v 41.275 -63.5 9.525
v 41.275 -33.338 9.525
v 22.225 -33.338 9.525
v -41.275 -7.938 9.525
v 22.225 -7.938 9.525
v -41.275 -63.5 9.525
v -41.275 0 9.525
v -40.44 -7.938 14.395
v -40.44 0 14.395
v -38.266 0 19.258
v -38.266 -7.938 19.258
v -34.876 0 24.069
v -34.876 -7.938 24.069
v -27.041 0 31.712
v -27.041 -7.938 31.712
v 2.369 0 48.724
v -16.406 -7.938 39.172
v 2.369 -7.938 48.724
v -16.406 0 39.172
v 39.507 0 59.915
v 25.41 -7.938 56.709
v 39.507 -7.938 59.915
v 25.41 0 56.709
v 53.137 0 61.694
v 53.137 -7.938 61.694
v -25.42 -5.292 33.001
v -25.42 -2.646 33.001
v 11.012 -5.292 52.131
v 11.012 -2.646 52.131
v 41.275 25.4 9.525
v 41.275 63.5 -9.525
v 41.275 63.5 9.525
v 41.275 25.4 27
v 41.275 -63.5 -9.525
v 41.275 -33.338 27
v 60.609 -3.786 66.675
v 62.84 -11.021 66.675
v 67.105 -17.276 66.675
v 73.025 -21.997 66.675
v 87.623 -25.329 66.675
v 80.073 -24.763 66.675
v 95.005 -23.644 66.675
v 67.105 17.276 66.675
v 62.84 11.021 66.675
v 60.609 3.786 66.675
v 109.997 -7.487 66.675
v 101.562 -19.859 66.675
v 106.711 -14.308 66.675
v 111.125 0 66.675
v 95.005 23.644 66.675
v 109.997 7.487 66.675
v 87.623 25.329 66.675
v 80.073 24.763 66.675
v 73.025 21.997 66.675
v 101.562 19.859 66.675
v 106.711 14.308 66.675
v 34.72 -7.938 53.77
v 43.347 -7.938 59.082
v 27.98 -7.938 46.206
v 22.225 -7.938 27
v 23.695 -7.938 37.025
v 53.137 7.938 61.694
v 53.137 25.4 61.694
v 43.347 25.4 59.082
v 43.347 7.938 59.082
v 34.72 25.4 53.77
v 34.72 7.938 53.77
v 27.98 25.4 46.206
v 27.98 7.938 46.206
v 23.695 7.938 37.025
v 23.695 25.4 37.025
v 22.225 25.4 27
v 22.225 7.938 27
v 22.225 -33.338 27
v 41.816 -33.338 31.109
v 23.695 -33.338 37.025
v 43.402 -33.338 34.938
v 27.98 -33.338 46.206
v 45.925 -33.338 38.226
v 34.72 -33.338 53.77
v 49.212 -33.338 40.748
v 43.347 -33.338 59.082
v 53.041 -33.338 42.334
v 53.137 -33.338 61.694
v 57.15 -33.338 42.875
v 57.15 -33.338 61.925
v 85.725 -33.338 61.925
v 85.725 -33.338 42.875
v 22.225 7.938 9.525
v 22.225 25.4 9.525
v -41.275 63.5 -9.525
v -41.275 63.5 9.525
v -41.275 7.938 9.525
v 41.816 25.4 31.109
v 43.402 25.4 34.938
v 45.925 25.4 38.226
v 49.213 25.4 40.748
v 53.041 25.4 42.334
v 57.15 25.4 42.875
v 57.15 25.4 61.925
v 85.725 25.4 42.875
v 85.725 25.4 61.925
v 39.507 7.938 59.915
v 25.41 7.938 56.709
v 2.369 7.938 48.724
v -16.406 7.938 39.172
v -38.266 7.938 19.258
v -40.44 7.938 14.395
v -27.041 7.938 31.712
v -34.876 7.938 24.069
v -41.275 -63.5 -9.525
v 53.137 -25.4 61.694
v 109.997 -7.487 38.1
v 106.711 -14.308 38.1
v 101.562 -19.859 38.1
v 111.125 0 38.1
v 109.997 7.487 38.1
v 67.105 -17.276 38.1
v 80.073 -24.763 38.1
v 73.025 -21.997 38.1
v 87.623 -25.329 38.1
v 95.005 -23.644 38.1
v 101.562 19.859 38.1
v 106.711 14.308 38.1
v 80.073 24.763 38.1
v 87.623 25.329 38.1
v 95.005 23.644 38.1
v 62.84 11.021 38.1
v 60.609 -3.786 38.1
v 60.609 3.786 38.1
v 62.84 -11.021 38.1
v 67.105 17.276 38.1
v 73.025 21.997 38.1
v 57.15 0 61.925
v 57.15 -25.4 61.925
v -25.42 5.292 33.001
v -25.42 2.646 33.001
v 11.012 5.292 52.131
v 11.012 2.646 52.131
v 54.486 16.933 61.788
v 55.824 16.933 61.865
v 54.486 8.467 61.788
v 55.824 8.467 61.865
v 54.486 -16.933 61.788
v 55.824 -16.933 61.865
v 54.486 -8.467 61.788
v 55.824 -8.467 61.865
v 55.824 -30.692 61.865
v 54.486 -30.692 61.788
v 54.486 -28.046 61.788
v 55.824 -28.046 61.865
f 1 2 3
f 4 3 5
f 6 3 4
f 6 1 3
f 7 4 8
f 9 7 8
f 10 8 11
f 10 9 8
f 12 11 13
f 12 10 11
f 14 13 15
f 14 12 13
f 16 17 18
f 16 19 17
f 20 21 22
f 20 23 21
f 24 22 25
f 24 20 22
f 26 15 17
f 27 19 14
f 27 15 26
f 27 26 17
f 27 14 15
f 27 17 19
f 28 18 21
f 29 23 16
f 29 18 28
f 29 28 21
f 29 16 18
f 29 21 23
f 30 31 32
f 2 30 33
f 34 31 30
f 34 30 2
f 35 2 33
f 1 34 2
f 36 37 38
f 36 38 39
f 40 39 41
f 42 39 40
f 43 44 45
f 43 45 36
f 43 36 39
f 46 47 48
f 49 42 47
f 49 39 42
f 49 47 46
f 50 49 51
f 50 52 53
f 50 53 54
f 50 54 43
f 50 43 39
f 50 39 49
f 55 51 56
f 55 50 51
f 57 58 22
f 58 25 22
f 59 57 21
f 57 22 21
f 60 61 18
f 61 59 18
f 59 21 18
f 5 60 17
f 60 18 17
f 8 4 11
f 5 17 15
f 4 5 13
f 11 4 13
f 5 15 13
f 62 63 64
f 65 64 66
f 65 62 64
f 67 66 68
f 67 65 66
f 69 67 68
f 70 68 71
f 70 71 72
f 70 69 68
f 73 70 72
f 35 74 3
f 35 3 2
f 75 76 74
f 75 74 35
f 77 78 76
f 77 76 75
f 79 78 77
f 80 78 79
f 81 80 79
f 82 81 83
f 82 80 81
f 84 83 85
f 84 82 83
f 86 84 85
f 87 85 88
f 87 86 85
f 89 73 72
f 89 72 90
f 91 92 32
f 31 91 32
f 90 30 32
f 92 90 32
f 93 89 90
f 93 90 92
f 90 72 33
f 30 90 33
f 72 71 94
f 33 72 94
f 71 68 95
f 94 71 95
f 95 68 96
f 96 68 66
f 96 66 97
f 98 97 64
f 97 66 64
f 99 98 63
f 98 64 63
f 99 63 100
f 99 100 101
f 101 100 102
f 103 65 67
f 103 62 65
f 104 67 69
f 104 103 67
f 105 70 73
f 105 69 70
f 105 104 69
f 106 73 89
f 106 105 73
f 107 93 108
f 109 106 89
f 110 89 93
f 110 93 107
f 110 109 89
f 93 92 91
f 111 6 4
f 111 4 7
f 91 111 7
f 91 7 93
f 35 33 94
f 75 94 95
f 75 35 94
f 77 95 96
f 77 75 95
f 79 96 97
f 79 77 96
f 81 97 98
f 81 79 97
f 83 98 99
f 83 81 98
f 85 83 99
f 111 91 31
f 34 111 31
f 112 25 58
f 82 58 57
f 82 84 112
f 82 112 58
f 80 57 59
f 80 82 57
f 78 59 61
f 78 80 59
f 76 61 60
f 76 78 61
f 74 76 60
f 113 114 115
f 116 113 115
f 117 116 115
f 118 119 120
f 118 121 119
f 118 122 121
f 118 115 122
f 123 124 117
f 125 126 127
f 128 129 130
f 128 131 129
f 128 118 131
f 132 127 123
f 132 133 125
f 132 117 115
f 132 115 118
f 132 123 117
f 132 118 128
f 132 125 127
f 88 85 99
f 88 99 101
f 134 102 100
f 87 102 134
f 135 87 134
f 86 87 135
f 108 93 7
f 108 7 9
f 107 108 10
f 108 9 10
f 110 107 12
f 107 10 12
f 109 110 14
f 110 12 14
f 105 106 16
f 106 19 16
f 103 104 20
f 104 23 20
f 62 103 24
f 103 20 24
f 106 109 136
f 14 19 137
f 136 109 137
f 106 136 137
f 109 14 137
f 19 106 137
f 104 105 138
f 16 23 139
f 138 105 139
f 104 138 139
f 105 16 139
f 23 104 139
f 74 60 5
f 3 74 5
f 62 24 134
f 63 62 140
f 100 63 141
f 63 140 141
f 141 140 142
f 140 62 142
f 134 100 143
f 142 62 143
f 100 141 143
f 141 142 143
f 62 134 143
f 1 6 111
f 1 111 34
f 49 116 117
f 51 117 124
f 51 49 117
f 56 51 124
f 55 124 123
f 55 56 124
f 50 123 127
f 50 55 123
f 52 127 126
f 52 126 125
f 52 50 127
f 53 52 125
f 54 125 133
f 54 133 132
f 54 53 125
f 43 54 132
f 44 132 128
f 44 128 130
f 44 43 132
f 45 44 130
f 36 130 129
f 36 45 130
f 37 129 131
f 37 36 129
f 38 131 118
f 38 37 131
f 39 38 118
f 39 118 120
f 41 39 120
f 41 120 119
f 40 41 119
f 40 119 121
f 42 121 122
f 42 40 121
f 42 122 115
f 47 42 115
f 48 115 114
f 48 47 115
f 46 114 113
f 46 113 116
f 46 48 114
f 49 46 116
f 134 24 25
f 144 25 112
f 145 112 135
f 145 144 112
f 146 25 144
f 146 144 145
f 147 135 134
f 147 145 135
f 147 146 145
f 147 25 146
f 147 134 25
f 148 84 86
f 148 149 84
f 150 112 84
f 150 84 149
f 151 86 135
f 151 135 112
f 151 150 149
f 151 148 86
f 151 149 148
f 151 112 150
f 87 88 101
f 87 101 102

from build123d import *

# Parameters (mm, degrees)
F1_DEPTH = 63.5
F0_W     = 25.4
F0_H     = 19.05
F2_DEPTH = 25.4
F3_DEPTH = 7.9375


with BuildPart() as f1:
    # F0 (on Front) → F1 (new body, symmetric)
    with BuildSketch(Plane.XZ):
        Polygon((22.225, 9.525), (-41.275, 9.525), (-41.275, -9.525), (41.275, -9.525), (41.275, 9.525), align=None)
    extrude(amount=F1_DEPTH, both=True)

    # F0 (on Front) → F2 (join, symmetric)
    with BuildSketch(Plane.XZ):
        with Locations((73.025, 52.4002)):
            Rectangle(F0_W, F0_H)
        with BuildLine():
            Line((22.225, 27.0002), (22.225, 9.525))
            Line((22.225, 9.525), (41.275, 9.525))
            Line((41.275, 9.525), (41.275, 27.0002))
            ThreePointArc((41.275, 27.0002), (45.9246798487, 38.2255201513), (57.15, 42.8752))
            Line((57.15, 42.8752), (60.325, 42.8752))
            Line((60.325, 42.8752), (60.325, 61.9252))
            Line((60.325, 61.9252), (57.15, 61.9252))
            add(Edge.make_bspline(
                [(53.1367765772, 61.6938545028), (54.4911838956, 61.7966953046), (55.8297911563, 61.8741143082), (57.15, 61.9252)],
                knots=[107.8534909228, 107.8534909228, 107.8534909228, 107.8534909228, 111.5045361635, 111.5045361635, 111.5045361635, 111.5045361635], degree=3))
            ThreePointArc((53.1367765772, 61.6938545028), (31.073981774, 50.2337296173), (22.225, 27.0002))
        make_face()
    extrude(amount=F2_DEPTH, both=True)

    # F0 (on Front) + F2_face (on face) → F3 (join, symmetric)
    with BuildSketch(Plane.XZ):
        with BuildLine():
            add(Edge.make_bspline(
                [(-41.275, 9.525), (-40.6705320986, 33.4339088409), (13.1269854637, 58.6558917409), (53.1367765772, 61.6938545028)],
                knots=[0, 0, 0, 0, 107.8534909228, 107.8534909228, 107.8534909228, 107.8534909228], degree=3))
            Line((-41.275, 9.525), (22.225, 9.525))
            Line((22.225, 9.525), (22.225, 27.0002))
            ThreePointArc((22.225, 27.0002), (31.073981774, 50.2337296173), (53.1367765772, 61.6938545028))
        make_face()
    with BuildSketch(Plane(origin=(48.877117708, -25.4, 41.5252289167), x_dir=(1, 0, 0), z_dir=(0, -1, 0))):
        with BuildLine():
            Line((36.847882292, 20.3999710833), (8.272882292, 20.3999710833))
            add(Edge.make_bspline(
                [(4.2596588692, 20.1686255861), (5.6140661876, 20.2714663879), (6.9526734483, 20.3488853915), (8.272882292, 20.3999710833)],
                knots=[107.8534909228, 107.8534909228, 107.8534909228, 107.8534909228, 111.5045361635, 111.5045361635, 111.5045361635, 111.5045361635], degree=3))
            ThreePointArc((4.2596588692, 20.1686255861), (-17.803135934, 8.7085007007), (-26.652117708, -14.5250289167))
            Line((-26.652117708, -14.5250289167), (-26.652117708, -32.0002289167))
            Line((-26.652117708, -32.0002289167), (-7.602117708, -32.0002289167))
            Line((-7.602117708, -32.0002289167), (-7.602117708, -14.5250289167))
            ThreePointArc((-7.602117708, -14.5250289167), (-2.9524378593, -3.2997087653), (8.272882292, 1.3499710833))
            Line((8.272882292, 1.3499710833), (36.847882292, 1.3499710833))
            Line((36.847882292, 1.3499710833), (36.847882292, 20.3999710833))
        make_face()
    extrude(amount=F3_DEPTH, both=True)


with BuildPart() as f4:
    # F0 (on Front) → F4 (revolve)
    with BuildSketch(Plane.XZ):
        Polygon((85.725, 66.675), (85.725, 61.9252), (85.725, 42.8752), (85.725, 38.1), (111.125, 38.1), (111.125, 66.675), align=None)
    revolve(axis=Axis((85.725, 0, 52.3875), (0, 0, 1)))


solid = Compound([f1.part, f4.part])
